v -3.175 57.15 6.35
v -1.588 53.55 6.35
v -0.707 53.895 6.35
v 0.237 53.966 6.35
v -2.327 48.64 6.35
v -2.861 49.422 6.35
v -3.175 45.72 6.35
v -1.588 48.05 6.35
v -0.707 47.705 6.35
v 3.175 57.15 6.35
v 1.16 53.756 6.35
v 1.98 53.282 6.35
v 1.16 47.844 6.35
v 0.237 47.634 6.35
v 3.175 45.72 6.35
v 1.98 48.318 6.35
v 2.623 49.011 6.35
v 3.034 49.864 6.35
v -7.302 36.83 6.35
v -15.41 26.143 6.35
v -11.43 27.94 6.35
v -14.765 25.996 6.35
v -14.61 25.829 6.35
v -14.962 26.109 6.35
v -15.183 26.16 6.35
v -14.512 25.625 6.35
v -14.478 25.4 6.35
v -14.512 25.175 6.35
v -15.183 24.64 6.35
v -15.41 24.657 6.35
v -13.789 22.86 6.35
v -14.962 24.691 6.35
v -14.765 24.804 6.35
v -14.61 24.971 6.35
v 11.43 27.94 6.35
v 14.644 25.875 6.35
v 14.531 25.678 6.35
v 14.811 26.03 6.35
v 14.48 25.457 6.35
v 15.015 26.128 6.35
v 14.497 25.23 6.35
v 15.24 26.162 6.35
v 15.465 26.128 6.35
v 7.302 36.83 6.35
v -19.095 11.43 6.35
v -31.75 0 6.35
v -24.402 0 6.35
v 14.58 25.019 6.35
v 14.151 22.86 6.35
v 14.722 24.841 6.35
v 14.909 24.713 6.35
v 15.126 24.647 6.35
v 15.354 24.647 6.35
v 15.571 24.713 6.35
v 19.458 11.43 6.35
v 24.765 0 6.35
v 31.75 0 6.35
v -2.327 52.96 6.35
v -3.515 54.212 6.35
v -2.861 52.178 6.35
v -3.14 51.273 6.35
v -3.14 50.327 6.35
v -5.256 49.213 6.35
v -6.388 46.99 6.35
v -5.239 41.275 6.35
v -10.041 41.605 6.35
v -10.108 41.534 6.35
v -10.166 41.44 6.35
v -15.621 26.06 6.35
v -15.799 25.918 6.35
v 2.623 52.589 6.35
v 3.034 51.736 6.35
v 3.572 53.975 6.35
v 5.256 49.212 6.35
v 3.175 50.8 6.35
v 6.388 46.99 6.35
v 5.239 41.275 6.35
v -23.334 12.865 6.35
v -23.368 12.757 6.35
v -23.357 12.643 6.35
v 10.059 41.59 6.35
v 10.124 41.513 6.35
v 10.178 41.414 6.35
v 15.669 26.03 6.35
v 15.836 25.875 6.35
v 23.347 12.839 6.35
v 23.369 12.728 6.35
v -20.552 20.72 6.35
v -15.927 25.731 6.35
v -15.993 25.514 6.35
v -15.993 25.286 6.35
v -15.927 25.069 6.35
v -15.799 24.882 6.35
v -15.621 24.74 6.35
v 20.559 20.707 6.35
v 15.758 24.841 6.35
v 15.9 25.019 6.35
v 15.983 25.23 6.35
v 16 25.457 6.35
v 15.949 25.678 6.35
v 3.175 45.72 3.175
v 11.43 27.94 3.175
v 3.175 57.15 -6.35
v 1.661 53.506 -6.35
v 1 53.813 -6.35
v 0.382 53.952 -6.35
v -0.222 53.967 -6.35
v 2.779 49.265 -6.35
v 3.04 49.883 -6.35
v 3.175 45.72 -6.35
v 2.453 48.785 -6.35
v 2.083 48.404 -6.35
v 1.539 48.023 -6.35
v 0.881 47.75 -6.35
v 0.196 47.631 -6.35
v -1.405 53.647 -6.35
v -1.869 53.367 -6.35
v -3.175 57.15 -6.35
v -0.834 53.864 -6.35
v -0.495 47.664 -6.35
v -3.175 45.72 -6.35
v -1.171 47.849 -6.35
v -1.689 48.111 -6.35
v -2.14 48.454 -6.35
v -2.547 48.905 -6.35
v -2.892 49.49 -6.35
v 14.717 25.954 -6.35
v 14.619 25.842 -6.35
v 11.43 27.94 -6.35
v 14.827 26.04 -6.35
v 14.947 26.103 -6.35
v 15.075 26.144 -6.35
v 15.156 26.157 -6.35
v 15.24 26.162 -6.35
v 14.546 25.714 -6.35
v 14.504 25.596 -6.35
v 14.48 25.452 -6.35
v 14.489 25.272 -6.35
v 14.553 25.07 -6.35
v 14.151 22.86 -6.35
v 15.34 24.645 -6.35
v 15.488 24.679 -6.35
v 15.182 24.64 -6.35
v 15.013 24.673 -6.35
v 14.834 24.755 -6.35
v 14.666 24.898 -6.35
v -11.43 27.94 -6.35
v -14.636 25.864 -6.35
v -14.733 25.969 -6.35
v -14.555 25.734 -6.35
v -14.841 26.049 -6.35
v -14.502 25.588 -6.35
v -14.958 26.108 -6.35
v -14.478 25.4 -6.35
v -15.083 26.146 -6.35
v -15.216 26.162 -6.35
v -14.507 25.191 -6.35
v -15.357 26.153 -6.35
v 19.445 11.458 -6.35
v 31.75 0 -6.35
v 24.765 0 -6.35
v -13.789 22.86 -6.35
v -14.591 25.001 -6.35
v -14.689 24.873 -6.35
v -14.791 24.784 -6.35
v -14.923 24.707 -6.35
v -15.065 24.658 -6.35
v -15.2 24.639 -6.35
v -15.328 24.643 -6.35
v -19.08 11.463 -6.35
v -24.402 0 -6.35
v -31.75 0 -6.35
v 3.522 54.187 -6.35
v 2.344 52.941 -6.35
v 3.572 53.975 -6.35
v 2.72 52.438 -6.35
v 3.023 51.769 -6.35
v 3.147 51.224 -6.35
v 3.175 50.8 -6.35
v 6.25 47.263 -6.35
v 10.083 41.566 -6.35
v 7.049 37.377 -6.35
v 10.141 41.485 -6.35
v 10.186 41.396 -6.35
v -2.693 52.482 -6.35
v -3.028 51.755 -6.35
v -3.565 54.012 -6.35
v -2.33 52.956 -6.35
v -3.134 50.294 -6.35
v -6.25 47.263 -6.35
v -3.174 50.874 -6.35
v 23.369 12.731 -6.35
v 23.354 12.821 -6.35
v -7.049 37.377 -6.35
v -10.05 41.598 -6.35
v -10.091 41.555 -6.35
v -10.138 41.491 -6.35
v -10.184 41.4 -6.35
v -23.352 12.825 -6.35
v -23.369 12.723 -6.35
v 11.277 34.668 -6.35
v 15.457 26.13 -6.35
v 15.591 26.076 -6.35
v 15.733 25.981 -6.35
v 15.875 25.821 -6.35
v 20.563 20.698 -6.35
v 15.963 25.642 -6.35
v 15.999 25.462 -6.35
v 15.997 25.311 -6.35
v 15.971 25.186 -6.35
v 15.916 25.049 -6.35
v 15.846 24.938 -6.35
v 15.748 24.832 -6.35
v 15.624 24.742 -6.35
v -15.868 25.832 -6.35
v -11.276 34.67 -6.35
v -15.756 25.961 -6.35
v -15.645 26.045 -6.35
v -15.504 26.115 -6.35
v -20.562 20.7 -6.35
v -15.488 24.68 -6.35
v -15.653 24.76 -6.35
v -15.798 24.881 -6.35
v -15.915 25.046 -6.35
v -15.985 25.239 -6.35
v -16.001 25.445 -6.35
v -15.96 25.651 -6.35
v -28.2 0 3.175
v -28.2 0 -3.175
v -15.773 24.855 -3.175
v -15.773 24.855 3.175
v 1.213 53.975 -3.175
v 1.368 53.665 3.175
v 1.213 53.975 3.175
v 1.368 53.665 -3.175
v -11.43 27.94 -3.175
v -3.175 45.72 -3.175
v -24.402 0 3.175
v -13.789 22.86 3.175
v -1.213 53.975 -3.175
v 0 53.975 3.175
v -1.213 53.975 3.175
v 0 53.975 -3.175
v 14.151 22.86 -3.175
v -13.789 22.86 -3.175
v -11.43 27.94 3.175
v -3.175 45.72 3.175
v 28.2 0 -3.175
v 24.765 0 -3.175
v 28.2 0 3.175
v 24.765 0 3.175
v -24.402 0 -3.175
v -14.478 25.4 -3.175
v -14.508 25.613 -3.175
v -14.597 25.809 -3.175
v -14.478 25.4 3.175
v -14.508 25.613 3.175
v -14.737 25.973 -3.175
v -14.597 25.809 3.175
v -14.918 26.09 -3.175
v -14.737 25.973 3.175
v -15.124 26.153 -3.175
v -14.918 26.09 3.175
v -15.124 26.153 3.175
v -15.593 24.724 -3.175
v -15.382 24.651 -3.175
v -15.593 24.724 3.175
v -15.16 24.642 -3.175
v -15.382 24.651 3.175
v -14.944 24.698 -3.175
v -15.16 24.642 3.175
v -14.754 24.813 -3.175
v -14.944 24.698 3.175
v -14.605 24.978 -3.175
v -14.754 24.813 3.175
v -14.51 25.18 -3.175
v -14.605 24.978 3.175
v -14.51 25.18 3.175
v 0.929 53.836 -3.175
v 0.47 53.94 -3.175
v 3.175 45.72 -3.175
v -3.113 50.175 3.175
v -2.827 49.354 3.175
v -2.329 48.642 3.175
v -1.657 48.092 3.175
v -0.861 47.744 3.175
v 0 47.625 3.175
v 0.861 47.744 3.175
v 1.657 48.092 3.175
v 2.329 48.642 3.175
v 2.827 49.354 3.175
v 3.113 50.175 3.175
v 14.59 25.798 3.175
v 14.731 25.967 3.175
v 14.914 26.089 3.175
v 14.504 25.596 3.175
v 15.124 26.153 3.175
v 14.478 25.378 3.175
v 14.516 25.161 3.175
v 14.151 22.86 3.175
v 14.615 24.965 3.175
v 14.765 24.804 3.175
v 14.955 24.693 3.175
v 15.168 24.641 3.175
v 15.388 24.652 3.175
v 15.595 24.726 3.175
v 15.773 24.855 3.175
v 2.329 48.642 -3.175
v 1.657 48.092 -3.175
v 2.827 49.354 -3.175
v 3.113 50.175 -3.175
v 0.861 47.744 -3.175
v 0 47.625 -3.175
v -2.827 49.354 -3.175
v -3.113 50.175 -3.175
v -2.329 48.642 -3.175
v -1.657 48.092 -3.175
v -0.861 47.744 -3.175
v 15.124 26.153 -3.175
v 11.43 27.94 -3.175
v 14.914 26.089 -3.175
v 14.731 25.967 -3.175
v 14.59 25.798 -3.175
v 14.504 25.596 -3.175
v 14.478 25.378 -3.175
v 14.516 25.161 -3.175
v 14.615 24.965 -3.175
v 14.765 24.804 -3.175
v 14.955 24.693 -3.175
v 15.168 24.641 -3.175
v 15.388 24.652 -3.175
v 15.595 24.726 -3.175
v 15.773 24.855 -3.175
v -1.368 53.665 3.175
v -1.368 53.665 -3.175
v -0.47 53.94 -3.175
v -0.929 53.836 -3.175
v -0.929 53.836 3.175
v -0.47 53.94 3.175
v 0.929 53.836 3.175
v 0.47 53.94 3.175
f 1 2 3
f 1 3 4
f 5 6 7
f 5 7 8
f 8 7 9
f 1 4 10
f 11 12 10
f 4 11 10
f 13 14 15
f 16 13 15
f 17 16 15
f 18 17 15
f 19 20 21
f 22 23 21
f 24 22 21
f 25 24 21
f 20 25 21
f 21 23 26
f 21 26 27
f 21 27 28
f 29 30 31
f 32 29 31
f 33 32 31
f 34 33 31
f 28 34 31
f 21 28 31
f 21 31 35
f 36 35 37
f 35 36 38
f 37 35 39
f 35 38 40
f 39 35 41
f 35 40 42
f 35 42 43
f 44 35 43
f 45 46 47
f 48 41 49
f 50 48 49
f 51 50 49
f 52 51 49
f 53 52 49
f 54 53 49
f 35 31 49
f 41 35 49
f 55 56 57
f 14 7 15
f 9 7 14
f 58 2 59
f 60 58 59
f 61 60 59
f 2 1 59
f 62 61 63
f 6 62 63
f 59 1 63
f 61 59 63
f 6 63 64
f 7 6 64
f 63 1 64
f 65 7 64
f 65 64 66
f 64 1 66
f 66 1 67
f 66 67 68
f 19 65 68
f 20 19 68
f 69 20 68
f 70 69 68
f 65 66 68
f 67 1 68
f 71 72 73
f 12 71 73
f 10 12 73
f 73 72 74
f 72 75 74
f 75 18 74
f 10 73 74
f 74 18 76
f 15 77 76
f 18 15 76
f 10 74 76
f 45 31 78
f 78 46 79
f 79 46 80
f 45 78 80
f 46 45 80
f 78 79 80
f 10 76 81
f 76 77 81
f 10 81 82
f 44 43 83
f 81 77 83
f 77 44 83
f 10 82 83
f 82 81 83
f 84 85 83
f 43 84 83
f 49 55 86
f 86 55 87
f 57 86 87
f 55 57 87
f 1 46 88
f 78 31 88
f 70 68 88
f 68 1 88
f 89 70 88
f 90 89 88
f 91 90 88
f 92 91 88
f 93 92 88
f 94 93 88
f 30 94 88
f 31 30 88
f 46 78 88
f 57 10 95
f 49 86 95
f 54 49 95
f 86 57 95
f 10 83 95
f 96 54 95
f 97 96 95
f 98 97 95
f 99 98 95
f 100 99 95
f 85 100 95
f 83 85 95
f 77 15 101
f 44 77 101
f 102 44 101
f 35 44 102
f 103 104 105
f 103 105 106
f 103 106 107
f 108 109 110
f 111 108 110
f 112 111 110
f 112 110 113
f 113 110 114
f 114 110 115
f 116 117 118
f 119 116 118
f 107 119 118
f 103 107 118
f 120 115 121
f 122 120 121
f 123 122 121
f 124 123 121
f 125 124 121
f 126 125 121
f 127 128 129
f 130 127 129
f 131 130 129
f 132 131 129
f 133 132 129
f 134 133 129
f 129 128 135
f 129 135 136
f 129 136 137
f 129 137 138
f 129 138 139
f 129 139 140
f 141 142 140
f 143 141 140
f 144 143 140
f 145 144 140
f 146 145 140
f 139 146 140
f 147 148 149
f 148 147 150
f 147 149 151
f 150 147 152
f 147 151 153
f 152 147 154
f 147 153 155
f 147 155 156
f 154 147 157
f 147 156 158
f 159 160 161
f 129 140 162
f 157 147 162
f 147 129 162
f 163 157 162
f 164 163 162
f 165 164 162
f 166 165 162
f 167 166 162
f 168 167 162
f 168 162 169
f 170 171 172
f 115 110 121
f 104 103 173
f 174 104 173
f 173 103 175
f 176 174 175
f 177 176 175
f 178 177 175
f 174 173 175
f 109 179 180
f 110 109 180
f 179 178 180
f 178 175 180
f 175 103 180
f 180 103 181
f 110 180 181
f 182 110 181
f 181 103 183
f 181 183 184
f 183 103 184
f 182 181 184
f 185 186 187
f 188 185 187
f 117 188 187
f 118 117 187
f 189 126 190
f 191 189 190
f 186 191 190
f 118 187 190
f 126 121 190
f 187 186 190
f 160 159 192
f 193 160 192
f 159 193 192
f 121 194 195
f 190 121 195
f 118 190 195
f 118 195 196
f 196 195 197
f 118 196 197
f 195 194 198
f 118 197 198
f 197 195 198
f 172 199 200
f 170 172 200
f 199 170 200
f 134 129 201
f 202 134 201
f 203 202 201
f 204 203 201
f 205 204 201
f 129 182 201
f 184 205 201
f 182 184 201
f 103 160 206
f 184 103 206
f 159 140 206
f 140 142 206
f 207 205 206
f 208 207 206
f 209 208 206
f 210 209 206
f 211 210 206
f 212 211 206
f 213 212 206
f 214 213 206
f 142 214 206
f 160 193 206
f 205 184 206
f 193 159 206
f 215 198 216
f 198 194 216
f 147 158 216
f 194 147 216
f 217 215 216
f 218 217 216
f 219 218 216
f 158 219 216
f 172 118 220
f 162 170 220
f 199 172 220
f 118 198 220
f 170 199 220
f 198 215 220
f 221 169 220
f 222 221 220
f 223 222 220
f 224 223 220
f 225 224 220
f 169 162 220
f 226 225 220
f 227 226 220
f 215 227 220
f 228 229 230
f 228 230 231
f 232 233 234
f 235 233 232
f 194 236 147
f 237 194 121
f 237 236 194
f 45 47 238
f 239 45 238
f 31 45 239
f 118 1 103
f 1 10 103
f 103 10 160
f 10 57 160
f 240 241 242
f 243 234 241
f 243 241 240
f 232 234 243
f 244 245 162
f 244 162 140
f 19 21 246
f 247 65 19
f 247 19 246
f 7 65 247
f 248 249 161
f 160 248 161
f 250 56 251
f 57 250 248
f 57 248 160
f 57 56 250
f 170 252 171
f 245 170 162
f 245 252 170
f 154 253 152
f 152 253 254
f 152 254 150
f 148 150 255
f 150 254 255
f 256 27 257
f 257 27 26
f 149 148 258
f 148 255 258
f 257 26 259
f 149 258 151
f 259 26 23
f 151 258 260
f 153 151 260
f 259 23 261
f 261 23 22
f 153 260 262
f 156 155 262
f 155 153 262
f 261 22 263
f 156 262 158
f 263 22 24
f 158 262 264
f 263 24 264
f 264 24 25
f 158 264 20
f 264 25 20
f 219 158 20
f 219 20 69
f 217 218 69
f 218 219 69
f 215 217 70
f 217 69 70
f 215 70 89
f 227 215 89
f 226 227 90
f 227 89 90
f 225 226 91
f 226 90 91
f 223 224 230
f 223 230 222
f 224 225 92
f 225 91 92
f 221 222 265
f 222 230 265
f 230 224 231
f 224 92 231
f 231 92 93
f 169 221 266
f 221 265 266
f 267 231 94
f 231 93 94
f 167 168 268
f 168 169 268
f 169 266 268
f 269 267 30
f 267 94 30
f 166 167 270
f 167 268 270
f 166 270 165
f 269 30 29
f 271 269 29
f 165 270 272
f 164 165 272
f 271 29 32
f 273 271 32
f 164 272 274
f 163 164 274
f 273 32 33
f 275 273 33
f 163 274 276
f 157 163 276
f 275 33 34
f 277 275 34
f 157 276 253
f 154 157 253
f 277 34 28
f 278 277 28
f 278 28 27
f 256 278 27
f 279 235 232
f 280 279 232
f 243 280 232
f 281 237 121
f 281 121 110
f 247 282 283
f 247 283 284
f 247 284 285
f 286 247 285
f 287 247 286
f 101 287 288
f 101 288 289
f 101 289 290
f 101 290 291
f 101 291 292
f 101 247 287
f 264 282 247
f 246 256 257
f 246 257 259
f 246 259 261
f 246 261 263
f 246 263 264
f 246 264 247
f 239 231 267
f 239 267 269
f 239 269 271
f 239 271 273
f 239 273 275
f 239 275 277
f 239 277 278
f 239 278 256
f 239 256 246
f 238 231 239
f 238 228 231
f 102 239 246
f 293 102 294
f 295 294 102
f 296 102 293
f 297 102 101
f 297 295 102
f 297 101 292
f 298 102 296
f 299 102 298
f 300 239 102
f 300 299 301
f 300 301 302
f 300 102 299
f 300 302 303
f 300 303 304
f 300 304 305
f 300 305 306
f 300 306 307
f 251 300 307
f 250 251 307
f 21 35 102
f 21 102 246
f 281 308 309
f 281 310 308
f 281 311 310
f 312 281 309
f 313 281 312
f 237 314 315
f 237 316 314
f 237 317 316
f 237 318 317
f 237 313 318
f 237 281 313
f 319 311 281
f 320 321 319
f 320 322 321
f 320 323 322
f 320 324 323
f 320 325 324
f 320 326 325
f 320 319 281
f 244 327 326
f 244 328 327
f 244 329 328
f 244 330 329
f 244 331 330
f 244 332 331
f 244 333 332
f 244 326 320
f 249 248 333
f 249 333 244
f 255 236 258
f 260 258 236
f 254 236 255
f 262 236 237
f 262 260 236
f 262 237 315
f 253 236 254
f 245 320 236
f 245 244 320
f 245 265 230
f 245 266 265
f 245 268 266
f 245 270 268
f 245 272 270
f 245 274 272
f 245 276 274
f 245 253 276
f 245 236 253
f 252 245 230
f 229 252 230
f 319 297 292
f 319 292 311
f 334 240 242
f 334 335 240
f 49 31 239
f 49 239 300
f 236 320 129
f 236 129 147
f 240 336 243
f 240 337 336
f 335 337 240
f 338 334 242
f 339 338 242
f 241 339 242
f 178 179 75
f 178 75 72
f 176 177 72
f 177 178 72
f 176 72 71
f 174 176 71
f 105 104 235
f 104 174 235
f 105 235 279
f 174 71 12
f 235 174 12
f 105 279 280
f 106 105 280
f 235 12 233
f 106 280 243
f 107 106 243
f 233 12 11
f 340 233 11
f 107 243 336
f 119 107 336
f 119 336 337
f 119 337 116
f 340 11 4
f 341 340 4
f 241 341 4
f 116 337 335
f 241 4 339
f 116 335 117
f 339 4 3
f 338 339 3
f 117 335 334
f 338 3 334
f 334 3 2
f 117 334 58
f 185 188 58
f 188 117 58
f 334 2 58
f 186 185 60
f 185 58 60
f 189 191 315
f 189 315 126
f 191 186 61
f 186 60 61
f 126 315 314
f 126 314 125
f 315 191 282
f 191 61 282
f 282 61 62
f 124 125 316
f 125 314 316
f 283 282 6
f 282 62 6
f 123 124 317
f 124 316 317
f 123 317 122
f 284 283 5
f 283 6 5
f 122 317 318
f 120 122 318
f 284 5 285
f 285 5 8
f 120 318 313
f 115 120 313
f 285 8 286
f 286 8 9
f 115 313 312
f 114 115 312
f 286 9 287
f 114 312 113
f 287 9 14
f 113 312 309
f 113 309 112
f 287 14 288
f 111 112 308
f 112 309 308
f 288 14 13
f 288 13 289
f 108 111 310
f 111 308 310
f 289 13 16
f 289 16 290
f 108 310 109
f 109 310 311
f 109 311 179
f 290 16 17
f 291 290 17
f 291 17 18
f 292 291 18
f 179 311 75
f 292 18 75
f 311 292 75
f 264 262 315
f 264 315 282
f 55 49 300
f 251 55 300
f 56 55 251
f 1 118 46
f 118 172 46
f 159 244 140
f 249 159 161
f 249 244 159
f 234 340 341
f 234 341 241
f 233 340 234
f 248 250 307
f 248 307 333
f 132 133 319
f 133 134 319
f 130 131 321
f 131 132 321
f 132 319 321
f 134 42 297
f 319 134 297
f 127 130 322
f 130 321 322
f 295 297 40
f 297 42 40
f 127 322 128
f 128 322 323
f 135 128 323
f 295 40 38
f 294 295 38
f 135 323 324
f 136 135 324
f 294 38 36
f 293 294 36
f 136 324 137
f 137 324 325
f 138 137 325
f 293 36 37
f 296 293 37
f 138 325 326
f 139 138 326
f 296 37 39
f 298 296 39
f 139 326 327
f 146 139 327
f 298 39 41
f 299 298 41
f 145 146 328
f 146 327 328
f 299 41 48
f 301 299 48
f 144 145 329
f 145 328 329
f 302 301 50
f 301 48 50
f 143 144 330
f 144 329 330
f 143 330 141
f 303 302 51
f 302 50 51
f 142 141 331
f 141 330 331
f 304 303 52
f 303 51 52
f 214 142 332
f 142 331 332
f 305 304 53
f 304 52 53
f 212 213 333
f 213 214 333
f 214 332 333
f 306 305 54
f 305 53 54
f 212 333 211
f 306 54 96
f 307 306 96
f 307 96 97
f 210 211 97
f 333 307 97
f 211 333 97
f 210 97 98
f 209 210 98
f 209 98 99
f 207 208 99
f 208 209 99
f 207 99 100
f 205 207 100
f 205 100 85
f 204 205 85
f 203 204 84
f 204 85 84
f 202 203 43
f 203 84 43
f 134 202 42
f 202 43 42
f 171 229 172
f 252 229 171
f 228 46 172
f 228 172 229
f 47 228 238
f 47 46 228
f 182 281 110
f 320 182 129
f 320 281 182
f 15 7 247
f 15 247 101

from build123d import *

# Parameters (mm, degrees)
SHELL1_T                    = -6.35
CUT_EXTRUDE1_LETTER_A_DEPTH = 134.19872387
SKETCH4_R                   = 6.35
CUT_EXTRUDE2_AXLE_DEPTH     = 134.19872387
SCALE1_SCALE                = 0.5
SKETCH5_R                   = 0.762
CUT_EXTRUDE1_DEPTH          = 67.599362011


with BuildPart() as part:
    # Sketch2 → Loft1 section 0
    with BuildSketch(Plane(origin=(0, 114.3, 0), x_dir=(1, 0, 0), z_dir=(0, 1, 0))):
        with BuildLine():
            Line((-6.35, -12.7), (6.35, -12.7))
            Line((6.35, -12.7), (6.35, 12.7))
            Line((6.35, 12.7), (-6.35, 12.7))
            Line((-6.35, 12.7), (-6.35, -12.7))
        make_face()
    # Sketch1 → Loft1 section 1
    with BuildSketch(Plane(origin=(0, 0, 0), x_dir=(1, 0, 0), z_dir=(0, 1, 0))):
        with BuildLine():
            Line((-63.5, -12.7), (63.5, -12.7))
            Line((63.5, -12.7), (63.5, 12.7))
            Line((63.5, 12.7), (-63.5, 12.7))
            Line((-63.5, 12.7), (-63.5, -12.7))
        make_face()
    loft()

    # Shell1
    shell1_openings = [part.faces().sort_by_distance(p)[0] for p in [
        (0, 0, 0),
    ]]
    offset(amount=SHELL1_T, openings=shell1_openings, kind=Kind.INTERSECTION)

    # Sketch3 → Cut-Extrude1 Letter A (cut, through all)
    with BuildSketch(Plane.XY.offset(12.7)):
        Polygon((6.35, 91.44), (22.86, 55.88), (-22.86, 55.88), (-6.35, 91.44), align=None)
        Polygon((28.302857143, 45.72), (49.53, 0), (-48.804285714, 0), (-27.577142857, 45.72), align=None)
    extrude(amount=-CUT_EXTRUDE1_LETTER_A_DEPTH, mode=Mode.SUBTRACT)

    # Sketch4 → Cut-Extrude2 Axle (cut, through all)
    with BuildSketch(Plane.XY.offset(12.7)):
        with Locations((0, 101.6)):
            Circle(SKETCH4_R)
    extrude(amount=-CUT_EXTRUDE2_AXLE_DEPTH, mode=Mode.SUBTRACT)


with BuildPart() as part_1:
    # Scale1: scaled about (0, 0, 0)
    add(part.part.scale(SCALE1_SCALE))

    # Sketch5 → Cut-Extrude1 (cut, through all)
    with BuildSketch(Plane.XY.offset(6.35)):
        with Locations((-15.24, 25.4)):
            Circle(SKETCH5_R)
        with Locations(Location((15.24, 25.4, 0), (0, 0, 90))):
            Circle(SKETCH5_R)
    extrude(amount=-CUT_EXTRUDE1_DEPTH, mode=Mode.SUBTRACT)


solid = part_1.part
